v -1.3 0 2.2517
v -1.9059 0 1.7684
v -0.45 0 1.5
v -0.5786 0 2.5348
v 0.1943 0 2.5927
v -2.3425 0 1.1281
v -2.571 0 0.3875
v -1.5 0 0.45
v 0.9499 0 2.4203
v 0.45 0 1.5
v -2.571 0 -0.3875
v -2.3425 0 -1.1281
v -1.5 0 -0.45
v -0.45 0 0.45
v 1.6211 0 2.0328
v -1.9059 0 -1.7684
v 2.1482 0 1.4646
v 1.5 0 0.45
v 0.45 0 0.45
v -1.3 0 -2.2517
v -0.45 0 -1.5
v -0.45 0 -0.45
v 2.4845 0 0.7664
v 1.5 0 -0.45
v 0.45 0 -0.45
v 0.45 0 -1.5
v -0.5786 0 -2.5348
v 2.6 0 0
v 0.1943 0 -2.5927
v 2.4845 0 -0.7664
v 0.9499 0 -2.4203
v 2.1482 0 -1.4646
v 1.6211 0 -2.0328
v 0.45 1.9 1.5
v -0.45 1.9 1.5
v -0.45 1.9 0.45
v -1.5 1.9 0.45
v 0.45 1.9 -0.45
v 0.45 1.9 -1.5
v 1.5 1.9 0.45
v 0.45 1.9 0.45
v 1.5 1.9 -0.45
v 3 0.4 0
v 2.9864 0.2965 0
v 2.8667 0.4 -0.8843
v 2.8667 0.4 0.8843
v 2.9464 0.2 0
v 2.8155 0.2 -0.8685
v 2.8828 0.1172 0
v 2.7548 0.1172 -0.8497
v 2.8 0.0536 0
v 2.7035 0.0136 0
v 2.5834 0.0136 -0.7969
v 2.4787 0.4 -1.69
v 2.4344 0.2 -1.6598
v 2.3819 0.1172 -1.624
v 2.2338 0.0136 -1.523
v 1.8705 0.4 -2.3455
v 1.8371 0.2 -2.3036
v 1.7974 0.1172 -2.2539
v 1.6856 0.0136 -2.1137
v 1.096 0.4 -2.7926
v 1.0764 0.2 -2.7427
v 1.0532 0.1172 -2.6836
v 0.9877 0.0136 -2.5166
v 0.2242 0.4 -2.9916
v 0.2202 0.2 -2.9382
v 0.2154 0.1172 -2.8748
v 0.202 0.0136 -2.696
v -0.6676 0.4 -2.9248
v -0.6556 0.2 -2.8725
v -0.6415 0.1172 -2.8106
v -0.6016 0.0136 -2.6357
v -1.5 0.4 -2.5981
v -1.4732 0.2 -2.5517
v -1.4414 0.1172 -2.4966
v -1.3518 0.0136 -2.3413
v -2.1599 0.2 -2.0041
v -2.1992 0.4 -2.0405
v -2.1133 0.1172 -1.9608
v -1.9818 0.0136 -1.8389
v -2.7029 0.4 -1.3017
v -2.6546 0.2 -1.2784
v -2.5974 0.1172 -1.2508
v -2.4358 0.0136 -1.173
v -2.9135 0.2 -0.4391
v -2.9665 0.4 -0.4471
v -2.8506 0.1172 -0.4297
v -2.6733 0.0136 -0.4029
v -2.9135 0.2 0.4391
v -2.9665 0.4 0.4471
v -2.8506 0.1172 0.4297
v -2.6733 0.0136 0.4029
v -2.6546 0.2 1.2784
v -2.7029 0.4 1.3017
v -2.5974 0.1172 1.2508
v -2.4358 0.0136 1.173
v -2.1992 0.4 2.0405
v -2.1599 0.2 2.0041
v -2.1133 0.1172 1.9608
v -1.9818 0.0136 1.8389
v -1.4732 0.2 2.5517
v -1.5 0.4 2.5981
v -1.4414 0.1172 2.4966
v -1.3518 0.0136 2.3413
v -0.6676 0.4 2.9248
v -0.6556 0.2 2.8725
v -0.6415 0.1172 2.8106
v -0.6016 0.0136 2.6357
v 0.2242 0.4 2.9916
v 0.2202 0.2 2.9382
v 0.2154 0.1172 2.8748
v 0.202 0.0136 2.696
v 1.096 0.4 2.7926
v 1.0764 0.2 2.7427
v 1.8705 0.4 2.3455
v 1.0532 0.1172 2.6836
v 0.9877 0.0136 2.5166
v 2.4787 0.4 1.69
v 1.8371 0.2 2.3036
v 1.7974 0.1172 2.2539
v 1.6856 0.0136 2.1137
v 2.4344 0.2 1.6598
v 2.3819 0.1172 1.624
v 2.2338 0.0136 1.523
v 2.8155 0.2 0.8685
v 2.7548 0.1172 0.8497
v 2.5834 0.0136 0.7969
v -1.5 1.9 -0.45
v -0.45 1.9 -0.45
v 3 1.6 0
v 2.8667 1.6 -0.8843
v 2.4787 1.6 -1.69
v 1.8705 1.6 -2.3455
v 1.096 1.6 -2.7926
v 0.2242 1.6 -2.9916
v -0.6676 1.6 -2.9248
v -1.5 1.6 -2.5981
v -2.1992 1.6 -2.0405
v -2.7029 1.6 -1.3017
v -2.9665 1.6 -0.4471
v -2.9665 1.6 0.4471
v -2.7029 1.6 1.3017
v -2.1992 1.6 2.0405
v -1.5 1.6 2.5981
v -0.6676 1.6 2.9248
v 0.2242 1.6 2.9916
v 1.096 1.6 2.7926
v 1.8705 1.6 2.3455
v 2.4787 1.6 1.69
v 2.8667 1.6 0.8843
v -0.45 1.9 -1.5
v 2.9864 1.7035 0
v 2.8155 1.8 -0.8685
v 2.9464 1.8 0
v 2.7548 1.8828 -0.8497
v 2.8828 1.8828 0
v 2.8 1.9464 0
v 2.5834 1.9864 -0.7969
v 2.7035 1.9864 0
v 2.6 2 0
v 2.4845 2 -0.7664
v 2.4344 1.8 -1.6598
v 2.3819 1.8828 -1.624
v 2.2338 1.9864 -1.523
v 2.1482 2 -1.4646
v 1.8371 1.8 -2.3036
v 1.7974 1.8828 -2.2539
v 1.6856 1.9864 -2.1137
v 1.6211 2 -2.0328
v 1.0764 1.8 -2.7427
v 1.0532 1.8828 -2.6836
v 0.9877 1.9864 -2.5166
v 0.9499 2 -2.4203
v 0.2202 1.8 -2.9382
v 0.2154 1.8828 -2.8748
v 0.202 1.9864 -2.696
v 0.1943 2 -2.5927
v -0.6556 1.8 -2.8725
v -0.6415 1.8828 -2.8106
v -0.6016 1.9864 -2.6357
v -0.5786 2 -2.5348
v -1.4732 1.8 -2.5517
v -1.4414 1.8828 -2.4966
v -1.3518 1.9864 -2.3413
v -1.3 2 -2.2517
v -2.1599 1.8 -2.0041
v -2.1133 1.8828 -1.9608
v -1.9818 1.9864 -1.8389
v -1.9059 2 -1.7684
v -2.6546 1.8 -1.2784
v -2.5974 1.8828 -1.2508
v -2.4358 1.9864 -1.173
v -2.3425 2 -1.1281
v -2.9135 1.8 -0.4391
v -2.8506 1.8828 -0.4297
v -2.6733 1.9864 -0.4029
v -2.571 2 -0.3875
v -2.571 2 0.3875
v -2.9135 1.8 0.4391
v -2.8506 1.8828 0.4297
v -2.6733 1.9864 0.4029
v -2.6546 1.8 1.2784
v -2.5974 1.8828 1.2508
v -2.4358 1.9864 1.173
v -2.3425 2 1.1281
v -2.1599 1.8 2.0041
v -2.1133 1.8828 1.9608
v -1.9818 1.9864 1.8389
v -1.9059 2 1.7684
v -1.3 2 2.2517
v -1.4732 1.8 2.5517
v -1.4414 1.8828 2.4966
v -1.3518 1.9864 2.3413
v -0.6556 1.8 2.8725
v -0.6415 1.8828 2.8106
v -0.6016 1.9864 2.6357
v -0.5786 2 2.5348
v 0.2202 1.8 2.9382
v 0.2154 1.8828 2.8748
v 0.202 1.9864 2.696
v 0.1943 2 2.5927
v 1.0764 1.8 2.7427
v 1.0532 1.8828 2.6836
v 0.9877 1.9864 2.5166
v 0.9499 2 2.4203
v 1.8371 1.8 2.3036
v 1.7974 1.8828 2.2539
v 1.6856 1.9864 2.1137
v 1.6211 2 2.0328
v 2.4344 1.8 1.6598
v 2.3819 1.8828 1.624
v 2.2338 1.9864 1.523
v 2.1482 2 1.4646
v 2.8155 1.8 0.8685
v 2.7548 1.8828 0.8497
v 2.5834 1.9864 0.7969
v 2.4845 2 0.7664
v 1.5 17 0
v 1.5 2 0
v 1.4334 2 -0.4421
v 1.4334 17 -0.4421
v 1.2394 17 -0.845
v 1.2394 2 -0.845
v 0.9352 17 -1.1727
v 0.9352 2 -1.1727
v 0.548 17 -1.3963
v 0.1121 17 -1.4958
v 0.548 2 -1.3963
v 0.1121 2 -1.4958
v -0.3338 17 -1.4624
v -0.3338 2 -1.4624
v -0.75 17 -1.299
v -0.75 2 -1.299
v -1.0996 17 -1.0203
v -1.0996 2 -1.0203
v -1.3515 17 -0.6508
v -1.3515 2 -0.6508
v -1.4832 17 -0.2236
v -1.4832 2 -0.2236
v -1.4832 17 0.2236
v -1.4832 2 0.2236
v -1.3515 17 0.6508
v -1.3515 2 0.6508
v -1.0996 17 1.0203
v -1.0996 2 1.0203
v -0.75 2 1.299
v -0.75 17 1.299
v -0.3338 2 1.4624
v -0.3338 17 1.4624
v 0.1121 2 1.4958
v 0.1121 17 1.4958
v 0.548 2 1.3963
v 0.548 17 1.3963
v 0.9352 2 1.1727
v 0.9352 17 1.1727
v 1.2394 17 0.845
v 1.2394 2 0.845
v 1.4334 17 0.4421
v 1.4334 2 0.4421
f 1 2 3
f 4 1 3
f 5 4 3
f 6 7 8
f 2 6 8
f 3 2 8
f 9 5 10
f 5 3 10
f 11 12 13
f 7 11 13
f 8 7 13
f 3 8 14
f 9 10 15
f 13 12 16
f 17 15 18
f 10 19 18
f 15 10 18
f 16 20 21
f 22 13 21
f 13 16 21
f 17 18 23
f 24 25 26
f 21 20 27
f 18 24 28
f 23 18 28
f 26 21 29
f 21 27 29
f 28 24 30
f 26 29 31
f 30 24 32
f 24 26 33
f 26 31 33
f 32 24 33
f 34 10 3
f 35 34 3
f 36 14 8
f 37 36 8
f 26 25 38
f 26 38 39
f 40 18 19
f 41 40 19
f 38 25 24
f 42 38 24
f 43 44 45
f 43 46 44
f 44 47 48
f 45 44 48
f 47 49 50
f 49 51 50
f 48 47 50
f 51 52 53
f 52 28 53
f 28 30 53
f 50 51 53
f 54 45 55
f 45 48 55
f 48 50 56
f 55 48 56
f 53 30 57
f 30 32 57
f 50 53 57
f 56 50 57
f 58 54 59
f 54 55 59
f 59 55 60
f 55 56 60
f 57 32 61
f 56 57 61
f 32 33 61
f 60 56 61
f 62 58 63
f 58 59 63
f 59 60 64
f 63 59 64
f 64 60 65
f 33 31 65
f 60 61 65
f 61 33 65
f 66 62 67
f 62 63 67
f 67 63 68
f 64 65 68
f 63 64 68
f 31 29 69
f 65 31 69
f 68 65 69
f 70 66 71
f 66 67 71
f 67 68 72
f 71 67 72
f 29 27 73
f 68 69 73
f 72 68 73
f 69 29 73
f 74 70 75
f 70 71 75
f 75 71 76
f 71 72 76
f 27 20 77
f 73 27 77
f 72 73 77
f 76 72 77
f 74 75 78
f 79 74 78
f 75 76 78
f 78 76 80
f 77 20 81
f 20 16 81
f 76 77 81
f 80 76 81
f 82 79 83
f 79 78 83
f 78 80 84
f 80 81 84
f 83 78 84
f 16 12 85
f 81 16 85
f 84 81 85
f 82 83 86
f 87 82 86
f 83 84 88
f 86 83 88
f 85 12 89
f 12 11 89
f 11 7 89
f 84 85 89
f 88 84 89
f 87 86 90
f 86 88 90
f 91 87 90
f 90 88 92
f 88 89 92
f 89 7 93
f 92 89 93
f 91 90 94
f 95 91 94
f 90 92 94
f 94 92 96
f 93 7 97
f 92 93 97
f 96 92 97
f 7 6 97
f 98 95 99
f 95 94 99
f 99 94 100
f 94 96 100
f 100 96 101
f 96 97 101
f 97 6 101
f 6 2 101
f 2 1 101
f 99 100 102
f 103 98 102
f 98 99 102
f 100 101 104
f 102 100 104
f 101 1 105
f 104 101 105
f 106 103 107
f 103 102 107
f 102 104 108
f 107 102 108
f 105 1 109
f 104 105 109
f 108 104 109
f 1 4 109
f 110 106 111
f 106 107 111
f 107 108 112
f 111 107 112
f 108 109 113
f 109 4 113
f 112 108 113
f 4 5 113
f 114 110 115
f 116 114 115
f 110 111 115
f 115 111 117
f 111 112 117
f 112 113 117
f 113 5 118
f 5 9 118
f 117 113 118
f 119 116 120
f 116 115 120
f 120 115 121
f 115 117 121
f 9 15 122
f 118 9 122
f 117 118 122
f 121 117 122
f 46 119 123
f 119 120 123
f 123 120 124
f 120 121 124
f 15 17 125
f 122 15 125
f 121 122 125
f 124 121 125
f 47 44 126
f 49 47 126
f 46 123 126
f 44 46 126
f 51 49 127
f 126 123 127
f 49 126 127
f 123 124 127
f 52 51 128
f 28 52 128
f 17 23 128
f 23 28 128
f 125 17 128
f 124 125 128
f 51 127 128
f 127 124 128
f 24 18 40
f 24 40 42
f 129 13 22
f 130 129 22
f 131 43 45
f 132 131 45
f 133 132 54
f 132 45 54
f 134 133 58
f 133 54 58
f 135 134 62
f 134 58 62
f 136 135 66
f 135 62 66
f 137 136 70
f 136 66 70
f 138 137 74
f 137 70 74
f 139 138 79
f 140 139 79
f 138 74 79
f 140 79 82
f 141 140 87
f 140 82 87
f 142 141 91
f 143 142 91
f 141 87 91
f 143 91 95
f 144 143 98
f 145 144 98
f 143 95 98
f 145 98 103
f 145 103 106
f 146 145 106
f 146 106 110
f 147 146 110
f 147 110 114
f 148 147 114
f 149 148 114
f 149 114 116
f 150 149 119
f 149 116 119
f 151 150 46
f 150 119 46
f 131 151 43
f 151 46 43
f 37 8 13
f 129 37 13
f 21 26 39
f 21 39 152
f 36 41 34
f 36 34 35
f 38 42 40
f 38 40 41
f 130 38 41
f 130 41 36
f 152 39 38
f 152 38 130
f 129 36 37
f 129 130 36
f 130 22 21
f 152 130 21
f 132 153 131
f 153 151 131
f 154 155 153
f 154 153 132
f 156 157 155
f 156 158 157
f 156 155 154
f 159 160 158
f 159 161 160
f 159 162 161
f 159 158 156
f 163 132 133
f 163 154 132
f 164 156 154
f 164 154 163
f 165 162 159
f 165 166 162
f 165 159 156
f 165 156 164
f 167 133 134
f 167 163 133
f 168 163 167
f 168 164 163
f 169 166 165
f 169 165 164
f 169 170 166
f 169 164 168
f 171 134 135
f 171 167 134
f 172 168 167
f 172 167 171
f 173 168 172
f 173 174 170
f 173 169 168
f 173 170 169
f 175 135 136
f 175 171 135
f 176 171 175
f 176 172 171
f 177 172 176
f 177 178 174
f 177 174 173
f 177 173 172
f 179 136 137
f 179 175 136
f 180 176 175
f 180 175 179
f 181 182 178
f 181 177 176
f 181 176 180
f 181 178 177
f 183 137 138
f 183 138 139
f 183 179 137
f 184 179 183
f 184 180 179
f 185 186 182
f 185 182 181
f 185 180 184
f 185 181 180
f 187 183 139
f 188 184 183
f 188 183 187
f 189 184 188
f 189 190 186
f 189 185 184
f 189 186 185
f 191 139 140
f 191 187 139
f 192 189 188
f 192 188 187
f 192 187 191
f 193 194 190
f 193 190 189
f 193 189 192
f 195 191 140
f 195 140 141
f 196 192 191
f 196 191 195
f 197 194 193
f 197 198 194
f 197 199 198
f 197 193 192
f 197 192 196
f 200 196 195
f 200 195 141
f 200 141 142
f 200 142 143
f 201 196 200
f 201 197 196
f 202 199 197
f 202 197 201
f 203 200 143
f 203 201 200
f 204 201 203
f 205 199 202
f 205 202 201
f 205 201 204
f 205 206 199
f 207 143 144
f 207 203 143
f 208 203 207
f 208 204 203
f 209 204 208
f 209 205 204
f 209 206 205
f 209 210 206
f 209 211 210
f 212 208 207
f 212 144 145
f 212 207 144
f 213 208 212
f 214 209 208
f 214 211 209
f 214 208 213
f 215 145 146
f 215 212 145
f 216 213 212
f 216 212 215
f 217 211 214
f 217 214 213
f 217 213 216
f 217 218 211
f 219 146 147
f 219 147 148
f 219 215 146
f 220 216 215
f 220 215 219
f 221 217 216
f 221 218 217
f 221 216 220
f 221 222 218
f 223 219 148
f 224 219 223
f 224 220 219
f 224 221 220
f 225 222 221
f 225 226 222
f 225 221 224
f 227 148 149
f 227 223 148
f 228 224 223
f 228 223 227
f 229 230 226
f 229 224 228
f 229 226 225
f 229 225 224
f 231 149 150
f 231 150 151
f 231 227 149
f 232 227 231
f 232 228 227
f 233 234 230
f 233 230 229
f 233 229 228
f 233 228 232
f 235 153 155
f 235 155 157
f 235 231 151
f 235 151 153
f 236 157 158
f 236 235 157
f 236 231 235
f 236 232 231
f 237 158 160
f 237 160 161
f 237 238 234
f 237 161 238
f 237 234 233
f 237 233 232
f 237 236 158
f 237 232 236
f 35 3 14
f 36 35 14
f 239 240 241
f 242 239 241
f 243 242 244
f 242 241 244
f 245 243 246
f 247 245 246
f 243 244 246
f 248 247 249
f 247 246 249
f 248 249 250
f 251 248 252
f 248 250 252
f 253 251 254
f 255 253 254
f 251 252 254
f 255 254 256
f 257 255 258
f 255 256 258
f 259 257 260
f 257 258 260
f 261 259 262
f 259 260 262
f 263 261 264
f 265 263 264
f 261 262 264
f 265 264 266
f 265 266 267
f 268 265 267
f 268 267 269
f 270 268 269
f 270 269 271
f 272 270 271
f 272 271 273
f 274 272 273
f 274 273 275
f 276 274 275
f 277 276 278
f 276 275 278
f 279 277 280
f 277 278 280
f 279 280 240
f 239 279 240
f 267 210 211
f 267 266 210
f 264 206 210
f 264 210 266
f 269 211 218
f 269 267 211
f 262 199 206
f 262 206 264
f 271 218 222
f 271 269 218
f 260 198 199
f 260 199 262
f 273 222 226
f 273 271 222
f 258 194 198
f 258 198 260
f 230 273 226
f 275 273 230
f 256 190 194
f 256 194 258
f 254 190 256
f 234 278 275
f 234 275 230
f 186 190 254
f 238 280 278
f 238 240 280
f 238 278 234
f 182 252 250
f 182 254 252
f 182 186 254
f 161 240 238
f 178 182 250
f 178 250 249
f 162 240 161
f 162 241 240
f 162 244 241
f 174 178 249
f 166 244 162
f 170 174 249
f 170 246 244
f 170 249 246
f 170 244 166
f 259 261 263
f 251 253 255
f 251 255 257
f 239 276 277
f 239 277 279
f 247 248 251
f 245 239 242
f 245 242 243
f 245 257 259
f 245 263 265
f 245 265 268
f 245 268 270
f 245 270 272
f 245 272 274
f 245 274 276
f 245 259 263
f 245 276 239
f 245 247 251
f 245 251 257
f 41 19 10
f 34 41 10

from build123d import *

# Parameters (mm, degrees)
SKETCH1_R           = 3
BOSS_EXTRUDE1_DEPTH = 2
SKETCH2_R           = 1.5
BOSS_EXTRUDE2_DEPTH = 15
SKETCH3_W           = 0.9
SKETCH3_H           = 0.9
SKETCH3_W_2         = 1.05
SKETCH3_H_2         = 1.05
CUT_EXTRUDE1_DEPTH  = 1.9
FILLET1_R           = 0.4


with BuildPart() as part:
    # Sketch1 → Boss-Extrude1 (new body)
    with BuildSketch(Plane(origin=(0, 0, 0), x_dir=(1, 0, 0), z_dir=(0, 1, 0))):
        Circle(SKETCH1_R)
    extrude(amount=BOSS_EXTRUDE1_DEPTH)

    # Sketch2 → Boss-Extrude2 (add)
    with BuildSketch(Plane(origin=(0, 2, 0), x_dir=(1, 0, 0), z_dir=(0, 1, 0))):
        Circle(SKETCH2_R)
    extrude(amount=BOSS_EXTRUDE2_DEPTH)

    # Sketch3 → Cut-Extrude1 (cut)
    with BuildSketch(Plane(origin=(0, 0, 0), x_dir=(-1, 0, 0), z_dir=(0, -1, 0))):
        Rectangle(SKETCH3_W, SKETCH3_H)
        with Locations((0.975, 0)):
            Rectangle(SKETCH3_W_2, SKETCH3_H)
        with Locations((0, -0.975)):
            Rectangle(SKETCH3_W, SKETCH3_H_2)
        with Locations((-0.975, 0)):
            Rectangle(SKETCH3_W_2, SKETCH3_H)
        with Locations((0, 0.975)):
            Rectangle(SKETCH3_W, SKETCH3_H_2)
    extrude(amount=-CUT_EXTRUDE1_DEPTH, mode=Mode.SUBTRACT)

    # Fillet1
    fillet1_edges = [part.edges().sort_by_distance(p)[0] for p in [
        (-3, 0, 0),
        (-3, 2, 0),
    ]]
    fillet(fillet1_edges, radius=FILLET1_R)


solid = part.part
